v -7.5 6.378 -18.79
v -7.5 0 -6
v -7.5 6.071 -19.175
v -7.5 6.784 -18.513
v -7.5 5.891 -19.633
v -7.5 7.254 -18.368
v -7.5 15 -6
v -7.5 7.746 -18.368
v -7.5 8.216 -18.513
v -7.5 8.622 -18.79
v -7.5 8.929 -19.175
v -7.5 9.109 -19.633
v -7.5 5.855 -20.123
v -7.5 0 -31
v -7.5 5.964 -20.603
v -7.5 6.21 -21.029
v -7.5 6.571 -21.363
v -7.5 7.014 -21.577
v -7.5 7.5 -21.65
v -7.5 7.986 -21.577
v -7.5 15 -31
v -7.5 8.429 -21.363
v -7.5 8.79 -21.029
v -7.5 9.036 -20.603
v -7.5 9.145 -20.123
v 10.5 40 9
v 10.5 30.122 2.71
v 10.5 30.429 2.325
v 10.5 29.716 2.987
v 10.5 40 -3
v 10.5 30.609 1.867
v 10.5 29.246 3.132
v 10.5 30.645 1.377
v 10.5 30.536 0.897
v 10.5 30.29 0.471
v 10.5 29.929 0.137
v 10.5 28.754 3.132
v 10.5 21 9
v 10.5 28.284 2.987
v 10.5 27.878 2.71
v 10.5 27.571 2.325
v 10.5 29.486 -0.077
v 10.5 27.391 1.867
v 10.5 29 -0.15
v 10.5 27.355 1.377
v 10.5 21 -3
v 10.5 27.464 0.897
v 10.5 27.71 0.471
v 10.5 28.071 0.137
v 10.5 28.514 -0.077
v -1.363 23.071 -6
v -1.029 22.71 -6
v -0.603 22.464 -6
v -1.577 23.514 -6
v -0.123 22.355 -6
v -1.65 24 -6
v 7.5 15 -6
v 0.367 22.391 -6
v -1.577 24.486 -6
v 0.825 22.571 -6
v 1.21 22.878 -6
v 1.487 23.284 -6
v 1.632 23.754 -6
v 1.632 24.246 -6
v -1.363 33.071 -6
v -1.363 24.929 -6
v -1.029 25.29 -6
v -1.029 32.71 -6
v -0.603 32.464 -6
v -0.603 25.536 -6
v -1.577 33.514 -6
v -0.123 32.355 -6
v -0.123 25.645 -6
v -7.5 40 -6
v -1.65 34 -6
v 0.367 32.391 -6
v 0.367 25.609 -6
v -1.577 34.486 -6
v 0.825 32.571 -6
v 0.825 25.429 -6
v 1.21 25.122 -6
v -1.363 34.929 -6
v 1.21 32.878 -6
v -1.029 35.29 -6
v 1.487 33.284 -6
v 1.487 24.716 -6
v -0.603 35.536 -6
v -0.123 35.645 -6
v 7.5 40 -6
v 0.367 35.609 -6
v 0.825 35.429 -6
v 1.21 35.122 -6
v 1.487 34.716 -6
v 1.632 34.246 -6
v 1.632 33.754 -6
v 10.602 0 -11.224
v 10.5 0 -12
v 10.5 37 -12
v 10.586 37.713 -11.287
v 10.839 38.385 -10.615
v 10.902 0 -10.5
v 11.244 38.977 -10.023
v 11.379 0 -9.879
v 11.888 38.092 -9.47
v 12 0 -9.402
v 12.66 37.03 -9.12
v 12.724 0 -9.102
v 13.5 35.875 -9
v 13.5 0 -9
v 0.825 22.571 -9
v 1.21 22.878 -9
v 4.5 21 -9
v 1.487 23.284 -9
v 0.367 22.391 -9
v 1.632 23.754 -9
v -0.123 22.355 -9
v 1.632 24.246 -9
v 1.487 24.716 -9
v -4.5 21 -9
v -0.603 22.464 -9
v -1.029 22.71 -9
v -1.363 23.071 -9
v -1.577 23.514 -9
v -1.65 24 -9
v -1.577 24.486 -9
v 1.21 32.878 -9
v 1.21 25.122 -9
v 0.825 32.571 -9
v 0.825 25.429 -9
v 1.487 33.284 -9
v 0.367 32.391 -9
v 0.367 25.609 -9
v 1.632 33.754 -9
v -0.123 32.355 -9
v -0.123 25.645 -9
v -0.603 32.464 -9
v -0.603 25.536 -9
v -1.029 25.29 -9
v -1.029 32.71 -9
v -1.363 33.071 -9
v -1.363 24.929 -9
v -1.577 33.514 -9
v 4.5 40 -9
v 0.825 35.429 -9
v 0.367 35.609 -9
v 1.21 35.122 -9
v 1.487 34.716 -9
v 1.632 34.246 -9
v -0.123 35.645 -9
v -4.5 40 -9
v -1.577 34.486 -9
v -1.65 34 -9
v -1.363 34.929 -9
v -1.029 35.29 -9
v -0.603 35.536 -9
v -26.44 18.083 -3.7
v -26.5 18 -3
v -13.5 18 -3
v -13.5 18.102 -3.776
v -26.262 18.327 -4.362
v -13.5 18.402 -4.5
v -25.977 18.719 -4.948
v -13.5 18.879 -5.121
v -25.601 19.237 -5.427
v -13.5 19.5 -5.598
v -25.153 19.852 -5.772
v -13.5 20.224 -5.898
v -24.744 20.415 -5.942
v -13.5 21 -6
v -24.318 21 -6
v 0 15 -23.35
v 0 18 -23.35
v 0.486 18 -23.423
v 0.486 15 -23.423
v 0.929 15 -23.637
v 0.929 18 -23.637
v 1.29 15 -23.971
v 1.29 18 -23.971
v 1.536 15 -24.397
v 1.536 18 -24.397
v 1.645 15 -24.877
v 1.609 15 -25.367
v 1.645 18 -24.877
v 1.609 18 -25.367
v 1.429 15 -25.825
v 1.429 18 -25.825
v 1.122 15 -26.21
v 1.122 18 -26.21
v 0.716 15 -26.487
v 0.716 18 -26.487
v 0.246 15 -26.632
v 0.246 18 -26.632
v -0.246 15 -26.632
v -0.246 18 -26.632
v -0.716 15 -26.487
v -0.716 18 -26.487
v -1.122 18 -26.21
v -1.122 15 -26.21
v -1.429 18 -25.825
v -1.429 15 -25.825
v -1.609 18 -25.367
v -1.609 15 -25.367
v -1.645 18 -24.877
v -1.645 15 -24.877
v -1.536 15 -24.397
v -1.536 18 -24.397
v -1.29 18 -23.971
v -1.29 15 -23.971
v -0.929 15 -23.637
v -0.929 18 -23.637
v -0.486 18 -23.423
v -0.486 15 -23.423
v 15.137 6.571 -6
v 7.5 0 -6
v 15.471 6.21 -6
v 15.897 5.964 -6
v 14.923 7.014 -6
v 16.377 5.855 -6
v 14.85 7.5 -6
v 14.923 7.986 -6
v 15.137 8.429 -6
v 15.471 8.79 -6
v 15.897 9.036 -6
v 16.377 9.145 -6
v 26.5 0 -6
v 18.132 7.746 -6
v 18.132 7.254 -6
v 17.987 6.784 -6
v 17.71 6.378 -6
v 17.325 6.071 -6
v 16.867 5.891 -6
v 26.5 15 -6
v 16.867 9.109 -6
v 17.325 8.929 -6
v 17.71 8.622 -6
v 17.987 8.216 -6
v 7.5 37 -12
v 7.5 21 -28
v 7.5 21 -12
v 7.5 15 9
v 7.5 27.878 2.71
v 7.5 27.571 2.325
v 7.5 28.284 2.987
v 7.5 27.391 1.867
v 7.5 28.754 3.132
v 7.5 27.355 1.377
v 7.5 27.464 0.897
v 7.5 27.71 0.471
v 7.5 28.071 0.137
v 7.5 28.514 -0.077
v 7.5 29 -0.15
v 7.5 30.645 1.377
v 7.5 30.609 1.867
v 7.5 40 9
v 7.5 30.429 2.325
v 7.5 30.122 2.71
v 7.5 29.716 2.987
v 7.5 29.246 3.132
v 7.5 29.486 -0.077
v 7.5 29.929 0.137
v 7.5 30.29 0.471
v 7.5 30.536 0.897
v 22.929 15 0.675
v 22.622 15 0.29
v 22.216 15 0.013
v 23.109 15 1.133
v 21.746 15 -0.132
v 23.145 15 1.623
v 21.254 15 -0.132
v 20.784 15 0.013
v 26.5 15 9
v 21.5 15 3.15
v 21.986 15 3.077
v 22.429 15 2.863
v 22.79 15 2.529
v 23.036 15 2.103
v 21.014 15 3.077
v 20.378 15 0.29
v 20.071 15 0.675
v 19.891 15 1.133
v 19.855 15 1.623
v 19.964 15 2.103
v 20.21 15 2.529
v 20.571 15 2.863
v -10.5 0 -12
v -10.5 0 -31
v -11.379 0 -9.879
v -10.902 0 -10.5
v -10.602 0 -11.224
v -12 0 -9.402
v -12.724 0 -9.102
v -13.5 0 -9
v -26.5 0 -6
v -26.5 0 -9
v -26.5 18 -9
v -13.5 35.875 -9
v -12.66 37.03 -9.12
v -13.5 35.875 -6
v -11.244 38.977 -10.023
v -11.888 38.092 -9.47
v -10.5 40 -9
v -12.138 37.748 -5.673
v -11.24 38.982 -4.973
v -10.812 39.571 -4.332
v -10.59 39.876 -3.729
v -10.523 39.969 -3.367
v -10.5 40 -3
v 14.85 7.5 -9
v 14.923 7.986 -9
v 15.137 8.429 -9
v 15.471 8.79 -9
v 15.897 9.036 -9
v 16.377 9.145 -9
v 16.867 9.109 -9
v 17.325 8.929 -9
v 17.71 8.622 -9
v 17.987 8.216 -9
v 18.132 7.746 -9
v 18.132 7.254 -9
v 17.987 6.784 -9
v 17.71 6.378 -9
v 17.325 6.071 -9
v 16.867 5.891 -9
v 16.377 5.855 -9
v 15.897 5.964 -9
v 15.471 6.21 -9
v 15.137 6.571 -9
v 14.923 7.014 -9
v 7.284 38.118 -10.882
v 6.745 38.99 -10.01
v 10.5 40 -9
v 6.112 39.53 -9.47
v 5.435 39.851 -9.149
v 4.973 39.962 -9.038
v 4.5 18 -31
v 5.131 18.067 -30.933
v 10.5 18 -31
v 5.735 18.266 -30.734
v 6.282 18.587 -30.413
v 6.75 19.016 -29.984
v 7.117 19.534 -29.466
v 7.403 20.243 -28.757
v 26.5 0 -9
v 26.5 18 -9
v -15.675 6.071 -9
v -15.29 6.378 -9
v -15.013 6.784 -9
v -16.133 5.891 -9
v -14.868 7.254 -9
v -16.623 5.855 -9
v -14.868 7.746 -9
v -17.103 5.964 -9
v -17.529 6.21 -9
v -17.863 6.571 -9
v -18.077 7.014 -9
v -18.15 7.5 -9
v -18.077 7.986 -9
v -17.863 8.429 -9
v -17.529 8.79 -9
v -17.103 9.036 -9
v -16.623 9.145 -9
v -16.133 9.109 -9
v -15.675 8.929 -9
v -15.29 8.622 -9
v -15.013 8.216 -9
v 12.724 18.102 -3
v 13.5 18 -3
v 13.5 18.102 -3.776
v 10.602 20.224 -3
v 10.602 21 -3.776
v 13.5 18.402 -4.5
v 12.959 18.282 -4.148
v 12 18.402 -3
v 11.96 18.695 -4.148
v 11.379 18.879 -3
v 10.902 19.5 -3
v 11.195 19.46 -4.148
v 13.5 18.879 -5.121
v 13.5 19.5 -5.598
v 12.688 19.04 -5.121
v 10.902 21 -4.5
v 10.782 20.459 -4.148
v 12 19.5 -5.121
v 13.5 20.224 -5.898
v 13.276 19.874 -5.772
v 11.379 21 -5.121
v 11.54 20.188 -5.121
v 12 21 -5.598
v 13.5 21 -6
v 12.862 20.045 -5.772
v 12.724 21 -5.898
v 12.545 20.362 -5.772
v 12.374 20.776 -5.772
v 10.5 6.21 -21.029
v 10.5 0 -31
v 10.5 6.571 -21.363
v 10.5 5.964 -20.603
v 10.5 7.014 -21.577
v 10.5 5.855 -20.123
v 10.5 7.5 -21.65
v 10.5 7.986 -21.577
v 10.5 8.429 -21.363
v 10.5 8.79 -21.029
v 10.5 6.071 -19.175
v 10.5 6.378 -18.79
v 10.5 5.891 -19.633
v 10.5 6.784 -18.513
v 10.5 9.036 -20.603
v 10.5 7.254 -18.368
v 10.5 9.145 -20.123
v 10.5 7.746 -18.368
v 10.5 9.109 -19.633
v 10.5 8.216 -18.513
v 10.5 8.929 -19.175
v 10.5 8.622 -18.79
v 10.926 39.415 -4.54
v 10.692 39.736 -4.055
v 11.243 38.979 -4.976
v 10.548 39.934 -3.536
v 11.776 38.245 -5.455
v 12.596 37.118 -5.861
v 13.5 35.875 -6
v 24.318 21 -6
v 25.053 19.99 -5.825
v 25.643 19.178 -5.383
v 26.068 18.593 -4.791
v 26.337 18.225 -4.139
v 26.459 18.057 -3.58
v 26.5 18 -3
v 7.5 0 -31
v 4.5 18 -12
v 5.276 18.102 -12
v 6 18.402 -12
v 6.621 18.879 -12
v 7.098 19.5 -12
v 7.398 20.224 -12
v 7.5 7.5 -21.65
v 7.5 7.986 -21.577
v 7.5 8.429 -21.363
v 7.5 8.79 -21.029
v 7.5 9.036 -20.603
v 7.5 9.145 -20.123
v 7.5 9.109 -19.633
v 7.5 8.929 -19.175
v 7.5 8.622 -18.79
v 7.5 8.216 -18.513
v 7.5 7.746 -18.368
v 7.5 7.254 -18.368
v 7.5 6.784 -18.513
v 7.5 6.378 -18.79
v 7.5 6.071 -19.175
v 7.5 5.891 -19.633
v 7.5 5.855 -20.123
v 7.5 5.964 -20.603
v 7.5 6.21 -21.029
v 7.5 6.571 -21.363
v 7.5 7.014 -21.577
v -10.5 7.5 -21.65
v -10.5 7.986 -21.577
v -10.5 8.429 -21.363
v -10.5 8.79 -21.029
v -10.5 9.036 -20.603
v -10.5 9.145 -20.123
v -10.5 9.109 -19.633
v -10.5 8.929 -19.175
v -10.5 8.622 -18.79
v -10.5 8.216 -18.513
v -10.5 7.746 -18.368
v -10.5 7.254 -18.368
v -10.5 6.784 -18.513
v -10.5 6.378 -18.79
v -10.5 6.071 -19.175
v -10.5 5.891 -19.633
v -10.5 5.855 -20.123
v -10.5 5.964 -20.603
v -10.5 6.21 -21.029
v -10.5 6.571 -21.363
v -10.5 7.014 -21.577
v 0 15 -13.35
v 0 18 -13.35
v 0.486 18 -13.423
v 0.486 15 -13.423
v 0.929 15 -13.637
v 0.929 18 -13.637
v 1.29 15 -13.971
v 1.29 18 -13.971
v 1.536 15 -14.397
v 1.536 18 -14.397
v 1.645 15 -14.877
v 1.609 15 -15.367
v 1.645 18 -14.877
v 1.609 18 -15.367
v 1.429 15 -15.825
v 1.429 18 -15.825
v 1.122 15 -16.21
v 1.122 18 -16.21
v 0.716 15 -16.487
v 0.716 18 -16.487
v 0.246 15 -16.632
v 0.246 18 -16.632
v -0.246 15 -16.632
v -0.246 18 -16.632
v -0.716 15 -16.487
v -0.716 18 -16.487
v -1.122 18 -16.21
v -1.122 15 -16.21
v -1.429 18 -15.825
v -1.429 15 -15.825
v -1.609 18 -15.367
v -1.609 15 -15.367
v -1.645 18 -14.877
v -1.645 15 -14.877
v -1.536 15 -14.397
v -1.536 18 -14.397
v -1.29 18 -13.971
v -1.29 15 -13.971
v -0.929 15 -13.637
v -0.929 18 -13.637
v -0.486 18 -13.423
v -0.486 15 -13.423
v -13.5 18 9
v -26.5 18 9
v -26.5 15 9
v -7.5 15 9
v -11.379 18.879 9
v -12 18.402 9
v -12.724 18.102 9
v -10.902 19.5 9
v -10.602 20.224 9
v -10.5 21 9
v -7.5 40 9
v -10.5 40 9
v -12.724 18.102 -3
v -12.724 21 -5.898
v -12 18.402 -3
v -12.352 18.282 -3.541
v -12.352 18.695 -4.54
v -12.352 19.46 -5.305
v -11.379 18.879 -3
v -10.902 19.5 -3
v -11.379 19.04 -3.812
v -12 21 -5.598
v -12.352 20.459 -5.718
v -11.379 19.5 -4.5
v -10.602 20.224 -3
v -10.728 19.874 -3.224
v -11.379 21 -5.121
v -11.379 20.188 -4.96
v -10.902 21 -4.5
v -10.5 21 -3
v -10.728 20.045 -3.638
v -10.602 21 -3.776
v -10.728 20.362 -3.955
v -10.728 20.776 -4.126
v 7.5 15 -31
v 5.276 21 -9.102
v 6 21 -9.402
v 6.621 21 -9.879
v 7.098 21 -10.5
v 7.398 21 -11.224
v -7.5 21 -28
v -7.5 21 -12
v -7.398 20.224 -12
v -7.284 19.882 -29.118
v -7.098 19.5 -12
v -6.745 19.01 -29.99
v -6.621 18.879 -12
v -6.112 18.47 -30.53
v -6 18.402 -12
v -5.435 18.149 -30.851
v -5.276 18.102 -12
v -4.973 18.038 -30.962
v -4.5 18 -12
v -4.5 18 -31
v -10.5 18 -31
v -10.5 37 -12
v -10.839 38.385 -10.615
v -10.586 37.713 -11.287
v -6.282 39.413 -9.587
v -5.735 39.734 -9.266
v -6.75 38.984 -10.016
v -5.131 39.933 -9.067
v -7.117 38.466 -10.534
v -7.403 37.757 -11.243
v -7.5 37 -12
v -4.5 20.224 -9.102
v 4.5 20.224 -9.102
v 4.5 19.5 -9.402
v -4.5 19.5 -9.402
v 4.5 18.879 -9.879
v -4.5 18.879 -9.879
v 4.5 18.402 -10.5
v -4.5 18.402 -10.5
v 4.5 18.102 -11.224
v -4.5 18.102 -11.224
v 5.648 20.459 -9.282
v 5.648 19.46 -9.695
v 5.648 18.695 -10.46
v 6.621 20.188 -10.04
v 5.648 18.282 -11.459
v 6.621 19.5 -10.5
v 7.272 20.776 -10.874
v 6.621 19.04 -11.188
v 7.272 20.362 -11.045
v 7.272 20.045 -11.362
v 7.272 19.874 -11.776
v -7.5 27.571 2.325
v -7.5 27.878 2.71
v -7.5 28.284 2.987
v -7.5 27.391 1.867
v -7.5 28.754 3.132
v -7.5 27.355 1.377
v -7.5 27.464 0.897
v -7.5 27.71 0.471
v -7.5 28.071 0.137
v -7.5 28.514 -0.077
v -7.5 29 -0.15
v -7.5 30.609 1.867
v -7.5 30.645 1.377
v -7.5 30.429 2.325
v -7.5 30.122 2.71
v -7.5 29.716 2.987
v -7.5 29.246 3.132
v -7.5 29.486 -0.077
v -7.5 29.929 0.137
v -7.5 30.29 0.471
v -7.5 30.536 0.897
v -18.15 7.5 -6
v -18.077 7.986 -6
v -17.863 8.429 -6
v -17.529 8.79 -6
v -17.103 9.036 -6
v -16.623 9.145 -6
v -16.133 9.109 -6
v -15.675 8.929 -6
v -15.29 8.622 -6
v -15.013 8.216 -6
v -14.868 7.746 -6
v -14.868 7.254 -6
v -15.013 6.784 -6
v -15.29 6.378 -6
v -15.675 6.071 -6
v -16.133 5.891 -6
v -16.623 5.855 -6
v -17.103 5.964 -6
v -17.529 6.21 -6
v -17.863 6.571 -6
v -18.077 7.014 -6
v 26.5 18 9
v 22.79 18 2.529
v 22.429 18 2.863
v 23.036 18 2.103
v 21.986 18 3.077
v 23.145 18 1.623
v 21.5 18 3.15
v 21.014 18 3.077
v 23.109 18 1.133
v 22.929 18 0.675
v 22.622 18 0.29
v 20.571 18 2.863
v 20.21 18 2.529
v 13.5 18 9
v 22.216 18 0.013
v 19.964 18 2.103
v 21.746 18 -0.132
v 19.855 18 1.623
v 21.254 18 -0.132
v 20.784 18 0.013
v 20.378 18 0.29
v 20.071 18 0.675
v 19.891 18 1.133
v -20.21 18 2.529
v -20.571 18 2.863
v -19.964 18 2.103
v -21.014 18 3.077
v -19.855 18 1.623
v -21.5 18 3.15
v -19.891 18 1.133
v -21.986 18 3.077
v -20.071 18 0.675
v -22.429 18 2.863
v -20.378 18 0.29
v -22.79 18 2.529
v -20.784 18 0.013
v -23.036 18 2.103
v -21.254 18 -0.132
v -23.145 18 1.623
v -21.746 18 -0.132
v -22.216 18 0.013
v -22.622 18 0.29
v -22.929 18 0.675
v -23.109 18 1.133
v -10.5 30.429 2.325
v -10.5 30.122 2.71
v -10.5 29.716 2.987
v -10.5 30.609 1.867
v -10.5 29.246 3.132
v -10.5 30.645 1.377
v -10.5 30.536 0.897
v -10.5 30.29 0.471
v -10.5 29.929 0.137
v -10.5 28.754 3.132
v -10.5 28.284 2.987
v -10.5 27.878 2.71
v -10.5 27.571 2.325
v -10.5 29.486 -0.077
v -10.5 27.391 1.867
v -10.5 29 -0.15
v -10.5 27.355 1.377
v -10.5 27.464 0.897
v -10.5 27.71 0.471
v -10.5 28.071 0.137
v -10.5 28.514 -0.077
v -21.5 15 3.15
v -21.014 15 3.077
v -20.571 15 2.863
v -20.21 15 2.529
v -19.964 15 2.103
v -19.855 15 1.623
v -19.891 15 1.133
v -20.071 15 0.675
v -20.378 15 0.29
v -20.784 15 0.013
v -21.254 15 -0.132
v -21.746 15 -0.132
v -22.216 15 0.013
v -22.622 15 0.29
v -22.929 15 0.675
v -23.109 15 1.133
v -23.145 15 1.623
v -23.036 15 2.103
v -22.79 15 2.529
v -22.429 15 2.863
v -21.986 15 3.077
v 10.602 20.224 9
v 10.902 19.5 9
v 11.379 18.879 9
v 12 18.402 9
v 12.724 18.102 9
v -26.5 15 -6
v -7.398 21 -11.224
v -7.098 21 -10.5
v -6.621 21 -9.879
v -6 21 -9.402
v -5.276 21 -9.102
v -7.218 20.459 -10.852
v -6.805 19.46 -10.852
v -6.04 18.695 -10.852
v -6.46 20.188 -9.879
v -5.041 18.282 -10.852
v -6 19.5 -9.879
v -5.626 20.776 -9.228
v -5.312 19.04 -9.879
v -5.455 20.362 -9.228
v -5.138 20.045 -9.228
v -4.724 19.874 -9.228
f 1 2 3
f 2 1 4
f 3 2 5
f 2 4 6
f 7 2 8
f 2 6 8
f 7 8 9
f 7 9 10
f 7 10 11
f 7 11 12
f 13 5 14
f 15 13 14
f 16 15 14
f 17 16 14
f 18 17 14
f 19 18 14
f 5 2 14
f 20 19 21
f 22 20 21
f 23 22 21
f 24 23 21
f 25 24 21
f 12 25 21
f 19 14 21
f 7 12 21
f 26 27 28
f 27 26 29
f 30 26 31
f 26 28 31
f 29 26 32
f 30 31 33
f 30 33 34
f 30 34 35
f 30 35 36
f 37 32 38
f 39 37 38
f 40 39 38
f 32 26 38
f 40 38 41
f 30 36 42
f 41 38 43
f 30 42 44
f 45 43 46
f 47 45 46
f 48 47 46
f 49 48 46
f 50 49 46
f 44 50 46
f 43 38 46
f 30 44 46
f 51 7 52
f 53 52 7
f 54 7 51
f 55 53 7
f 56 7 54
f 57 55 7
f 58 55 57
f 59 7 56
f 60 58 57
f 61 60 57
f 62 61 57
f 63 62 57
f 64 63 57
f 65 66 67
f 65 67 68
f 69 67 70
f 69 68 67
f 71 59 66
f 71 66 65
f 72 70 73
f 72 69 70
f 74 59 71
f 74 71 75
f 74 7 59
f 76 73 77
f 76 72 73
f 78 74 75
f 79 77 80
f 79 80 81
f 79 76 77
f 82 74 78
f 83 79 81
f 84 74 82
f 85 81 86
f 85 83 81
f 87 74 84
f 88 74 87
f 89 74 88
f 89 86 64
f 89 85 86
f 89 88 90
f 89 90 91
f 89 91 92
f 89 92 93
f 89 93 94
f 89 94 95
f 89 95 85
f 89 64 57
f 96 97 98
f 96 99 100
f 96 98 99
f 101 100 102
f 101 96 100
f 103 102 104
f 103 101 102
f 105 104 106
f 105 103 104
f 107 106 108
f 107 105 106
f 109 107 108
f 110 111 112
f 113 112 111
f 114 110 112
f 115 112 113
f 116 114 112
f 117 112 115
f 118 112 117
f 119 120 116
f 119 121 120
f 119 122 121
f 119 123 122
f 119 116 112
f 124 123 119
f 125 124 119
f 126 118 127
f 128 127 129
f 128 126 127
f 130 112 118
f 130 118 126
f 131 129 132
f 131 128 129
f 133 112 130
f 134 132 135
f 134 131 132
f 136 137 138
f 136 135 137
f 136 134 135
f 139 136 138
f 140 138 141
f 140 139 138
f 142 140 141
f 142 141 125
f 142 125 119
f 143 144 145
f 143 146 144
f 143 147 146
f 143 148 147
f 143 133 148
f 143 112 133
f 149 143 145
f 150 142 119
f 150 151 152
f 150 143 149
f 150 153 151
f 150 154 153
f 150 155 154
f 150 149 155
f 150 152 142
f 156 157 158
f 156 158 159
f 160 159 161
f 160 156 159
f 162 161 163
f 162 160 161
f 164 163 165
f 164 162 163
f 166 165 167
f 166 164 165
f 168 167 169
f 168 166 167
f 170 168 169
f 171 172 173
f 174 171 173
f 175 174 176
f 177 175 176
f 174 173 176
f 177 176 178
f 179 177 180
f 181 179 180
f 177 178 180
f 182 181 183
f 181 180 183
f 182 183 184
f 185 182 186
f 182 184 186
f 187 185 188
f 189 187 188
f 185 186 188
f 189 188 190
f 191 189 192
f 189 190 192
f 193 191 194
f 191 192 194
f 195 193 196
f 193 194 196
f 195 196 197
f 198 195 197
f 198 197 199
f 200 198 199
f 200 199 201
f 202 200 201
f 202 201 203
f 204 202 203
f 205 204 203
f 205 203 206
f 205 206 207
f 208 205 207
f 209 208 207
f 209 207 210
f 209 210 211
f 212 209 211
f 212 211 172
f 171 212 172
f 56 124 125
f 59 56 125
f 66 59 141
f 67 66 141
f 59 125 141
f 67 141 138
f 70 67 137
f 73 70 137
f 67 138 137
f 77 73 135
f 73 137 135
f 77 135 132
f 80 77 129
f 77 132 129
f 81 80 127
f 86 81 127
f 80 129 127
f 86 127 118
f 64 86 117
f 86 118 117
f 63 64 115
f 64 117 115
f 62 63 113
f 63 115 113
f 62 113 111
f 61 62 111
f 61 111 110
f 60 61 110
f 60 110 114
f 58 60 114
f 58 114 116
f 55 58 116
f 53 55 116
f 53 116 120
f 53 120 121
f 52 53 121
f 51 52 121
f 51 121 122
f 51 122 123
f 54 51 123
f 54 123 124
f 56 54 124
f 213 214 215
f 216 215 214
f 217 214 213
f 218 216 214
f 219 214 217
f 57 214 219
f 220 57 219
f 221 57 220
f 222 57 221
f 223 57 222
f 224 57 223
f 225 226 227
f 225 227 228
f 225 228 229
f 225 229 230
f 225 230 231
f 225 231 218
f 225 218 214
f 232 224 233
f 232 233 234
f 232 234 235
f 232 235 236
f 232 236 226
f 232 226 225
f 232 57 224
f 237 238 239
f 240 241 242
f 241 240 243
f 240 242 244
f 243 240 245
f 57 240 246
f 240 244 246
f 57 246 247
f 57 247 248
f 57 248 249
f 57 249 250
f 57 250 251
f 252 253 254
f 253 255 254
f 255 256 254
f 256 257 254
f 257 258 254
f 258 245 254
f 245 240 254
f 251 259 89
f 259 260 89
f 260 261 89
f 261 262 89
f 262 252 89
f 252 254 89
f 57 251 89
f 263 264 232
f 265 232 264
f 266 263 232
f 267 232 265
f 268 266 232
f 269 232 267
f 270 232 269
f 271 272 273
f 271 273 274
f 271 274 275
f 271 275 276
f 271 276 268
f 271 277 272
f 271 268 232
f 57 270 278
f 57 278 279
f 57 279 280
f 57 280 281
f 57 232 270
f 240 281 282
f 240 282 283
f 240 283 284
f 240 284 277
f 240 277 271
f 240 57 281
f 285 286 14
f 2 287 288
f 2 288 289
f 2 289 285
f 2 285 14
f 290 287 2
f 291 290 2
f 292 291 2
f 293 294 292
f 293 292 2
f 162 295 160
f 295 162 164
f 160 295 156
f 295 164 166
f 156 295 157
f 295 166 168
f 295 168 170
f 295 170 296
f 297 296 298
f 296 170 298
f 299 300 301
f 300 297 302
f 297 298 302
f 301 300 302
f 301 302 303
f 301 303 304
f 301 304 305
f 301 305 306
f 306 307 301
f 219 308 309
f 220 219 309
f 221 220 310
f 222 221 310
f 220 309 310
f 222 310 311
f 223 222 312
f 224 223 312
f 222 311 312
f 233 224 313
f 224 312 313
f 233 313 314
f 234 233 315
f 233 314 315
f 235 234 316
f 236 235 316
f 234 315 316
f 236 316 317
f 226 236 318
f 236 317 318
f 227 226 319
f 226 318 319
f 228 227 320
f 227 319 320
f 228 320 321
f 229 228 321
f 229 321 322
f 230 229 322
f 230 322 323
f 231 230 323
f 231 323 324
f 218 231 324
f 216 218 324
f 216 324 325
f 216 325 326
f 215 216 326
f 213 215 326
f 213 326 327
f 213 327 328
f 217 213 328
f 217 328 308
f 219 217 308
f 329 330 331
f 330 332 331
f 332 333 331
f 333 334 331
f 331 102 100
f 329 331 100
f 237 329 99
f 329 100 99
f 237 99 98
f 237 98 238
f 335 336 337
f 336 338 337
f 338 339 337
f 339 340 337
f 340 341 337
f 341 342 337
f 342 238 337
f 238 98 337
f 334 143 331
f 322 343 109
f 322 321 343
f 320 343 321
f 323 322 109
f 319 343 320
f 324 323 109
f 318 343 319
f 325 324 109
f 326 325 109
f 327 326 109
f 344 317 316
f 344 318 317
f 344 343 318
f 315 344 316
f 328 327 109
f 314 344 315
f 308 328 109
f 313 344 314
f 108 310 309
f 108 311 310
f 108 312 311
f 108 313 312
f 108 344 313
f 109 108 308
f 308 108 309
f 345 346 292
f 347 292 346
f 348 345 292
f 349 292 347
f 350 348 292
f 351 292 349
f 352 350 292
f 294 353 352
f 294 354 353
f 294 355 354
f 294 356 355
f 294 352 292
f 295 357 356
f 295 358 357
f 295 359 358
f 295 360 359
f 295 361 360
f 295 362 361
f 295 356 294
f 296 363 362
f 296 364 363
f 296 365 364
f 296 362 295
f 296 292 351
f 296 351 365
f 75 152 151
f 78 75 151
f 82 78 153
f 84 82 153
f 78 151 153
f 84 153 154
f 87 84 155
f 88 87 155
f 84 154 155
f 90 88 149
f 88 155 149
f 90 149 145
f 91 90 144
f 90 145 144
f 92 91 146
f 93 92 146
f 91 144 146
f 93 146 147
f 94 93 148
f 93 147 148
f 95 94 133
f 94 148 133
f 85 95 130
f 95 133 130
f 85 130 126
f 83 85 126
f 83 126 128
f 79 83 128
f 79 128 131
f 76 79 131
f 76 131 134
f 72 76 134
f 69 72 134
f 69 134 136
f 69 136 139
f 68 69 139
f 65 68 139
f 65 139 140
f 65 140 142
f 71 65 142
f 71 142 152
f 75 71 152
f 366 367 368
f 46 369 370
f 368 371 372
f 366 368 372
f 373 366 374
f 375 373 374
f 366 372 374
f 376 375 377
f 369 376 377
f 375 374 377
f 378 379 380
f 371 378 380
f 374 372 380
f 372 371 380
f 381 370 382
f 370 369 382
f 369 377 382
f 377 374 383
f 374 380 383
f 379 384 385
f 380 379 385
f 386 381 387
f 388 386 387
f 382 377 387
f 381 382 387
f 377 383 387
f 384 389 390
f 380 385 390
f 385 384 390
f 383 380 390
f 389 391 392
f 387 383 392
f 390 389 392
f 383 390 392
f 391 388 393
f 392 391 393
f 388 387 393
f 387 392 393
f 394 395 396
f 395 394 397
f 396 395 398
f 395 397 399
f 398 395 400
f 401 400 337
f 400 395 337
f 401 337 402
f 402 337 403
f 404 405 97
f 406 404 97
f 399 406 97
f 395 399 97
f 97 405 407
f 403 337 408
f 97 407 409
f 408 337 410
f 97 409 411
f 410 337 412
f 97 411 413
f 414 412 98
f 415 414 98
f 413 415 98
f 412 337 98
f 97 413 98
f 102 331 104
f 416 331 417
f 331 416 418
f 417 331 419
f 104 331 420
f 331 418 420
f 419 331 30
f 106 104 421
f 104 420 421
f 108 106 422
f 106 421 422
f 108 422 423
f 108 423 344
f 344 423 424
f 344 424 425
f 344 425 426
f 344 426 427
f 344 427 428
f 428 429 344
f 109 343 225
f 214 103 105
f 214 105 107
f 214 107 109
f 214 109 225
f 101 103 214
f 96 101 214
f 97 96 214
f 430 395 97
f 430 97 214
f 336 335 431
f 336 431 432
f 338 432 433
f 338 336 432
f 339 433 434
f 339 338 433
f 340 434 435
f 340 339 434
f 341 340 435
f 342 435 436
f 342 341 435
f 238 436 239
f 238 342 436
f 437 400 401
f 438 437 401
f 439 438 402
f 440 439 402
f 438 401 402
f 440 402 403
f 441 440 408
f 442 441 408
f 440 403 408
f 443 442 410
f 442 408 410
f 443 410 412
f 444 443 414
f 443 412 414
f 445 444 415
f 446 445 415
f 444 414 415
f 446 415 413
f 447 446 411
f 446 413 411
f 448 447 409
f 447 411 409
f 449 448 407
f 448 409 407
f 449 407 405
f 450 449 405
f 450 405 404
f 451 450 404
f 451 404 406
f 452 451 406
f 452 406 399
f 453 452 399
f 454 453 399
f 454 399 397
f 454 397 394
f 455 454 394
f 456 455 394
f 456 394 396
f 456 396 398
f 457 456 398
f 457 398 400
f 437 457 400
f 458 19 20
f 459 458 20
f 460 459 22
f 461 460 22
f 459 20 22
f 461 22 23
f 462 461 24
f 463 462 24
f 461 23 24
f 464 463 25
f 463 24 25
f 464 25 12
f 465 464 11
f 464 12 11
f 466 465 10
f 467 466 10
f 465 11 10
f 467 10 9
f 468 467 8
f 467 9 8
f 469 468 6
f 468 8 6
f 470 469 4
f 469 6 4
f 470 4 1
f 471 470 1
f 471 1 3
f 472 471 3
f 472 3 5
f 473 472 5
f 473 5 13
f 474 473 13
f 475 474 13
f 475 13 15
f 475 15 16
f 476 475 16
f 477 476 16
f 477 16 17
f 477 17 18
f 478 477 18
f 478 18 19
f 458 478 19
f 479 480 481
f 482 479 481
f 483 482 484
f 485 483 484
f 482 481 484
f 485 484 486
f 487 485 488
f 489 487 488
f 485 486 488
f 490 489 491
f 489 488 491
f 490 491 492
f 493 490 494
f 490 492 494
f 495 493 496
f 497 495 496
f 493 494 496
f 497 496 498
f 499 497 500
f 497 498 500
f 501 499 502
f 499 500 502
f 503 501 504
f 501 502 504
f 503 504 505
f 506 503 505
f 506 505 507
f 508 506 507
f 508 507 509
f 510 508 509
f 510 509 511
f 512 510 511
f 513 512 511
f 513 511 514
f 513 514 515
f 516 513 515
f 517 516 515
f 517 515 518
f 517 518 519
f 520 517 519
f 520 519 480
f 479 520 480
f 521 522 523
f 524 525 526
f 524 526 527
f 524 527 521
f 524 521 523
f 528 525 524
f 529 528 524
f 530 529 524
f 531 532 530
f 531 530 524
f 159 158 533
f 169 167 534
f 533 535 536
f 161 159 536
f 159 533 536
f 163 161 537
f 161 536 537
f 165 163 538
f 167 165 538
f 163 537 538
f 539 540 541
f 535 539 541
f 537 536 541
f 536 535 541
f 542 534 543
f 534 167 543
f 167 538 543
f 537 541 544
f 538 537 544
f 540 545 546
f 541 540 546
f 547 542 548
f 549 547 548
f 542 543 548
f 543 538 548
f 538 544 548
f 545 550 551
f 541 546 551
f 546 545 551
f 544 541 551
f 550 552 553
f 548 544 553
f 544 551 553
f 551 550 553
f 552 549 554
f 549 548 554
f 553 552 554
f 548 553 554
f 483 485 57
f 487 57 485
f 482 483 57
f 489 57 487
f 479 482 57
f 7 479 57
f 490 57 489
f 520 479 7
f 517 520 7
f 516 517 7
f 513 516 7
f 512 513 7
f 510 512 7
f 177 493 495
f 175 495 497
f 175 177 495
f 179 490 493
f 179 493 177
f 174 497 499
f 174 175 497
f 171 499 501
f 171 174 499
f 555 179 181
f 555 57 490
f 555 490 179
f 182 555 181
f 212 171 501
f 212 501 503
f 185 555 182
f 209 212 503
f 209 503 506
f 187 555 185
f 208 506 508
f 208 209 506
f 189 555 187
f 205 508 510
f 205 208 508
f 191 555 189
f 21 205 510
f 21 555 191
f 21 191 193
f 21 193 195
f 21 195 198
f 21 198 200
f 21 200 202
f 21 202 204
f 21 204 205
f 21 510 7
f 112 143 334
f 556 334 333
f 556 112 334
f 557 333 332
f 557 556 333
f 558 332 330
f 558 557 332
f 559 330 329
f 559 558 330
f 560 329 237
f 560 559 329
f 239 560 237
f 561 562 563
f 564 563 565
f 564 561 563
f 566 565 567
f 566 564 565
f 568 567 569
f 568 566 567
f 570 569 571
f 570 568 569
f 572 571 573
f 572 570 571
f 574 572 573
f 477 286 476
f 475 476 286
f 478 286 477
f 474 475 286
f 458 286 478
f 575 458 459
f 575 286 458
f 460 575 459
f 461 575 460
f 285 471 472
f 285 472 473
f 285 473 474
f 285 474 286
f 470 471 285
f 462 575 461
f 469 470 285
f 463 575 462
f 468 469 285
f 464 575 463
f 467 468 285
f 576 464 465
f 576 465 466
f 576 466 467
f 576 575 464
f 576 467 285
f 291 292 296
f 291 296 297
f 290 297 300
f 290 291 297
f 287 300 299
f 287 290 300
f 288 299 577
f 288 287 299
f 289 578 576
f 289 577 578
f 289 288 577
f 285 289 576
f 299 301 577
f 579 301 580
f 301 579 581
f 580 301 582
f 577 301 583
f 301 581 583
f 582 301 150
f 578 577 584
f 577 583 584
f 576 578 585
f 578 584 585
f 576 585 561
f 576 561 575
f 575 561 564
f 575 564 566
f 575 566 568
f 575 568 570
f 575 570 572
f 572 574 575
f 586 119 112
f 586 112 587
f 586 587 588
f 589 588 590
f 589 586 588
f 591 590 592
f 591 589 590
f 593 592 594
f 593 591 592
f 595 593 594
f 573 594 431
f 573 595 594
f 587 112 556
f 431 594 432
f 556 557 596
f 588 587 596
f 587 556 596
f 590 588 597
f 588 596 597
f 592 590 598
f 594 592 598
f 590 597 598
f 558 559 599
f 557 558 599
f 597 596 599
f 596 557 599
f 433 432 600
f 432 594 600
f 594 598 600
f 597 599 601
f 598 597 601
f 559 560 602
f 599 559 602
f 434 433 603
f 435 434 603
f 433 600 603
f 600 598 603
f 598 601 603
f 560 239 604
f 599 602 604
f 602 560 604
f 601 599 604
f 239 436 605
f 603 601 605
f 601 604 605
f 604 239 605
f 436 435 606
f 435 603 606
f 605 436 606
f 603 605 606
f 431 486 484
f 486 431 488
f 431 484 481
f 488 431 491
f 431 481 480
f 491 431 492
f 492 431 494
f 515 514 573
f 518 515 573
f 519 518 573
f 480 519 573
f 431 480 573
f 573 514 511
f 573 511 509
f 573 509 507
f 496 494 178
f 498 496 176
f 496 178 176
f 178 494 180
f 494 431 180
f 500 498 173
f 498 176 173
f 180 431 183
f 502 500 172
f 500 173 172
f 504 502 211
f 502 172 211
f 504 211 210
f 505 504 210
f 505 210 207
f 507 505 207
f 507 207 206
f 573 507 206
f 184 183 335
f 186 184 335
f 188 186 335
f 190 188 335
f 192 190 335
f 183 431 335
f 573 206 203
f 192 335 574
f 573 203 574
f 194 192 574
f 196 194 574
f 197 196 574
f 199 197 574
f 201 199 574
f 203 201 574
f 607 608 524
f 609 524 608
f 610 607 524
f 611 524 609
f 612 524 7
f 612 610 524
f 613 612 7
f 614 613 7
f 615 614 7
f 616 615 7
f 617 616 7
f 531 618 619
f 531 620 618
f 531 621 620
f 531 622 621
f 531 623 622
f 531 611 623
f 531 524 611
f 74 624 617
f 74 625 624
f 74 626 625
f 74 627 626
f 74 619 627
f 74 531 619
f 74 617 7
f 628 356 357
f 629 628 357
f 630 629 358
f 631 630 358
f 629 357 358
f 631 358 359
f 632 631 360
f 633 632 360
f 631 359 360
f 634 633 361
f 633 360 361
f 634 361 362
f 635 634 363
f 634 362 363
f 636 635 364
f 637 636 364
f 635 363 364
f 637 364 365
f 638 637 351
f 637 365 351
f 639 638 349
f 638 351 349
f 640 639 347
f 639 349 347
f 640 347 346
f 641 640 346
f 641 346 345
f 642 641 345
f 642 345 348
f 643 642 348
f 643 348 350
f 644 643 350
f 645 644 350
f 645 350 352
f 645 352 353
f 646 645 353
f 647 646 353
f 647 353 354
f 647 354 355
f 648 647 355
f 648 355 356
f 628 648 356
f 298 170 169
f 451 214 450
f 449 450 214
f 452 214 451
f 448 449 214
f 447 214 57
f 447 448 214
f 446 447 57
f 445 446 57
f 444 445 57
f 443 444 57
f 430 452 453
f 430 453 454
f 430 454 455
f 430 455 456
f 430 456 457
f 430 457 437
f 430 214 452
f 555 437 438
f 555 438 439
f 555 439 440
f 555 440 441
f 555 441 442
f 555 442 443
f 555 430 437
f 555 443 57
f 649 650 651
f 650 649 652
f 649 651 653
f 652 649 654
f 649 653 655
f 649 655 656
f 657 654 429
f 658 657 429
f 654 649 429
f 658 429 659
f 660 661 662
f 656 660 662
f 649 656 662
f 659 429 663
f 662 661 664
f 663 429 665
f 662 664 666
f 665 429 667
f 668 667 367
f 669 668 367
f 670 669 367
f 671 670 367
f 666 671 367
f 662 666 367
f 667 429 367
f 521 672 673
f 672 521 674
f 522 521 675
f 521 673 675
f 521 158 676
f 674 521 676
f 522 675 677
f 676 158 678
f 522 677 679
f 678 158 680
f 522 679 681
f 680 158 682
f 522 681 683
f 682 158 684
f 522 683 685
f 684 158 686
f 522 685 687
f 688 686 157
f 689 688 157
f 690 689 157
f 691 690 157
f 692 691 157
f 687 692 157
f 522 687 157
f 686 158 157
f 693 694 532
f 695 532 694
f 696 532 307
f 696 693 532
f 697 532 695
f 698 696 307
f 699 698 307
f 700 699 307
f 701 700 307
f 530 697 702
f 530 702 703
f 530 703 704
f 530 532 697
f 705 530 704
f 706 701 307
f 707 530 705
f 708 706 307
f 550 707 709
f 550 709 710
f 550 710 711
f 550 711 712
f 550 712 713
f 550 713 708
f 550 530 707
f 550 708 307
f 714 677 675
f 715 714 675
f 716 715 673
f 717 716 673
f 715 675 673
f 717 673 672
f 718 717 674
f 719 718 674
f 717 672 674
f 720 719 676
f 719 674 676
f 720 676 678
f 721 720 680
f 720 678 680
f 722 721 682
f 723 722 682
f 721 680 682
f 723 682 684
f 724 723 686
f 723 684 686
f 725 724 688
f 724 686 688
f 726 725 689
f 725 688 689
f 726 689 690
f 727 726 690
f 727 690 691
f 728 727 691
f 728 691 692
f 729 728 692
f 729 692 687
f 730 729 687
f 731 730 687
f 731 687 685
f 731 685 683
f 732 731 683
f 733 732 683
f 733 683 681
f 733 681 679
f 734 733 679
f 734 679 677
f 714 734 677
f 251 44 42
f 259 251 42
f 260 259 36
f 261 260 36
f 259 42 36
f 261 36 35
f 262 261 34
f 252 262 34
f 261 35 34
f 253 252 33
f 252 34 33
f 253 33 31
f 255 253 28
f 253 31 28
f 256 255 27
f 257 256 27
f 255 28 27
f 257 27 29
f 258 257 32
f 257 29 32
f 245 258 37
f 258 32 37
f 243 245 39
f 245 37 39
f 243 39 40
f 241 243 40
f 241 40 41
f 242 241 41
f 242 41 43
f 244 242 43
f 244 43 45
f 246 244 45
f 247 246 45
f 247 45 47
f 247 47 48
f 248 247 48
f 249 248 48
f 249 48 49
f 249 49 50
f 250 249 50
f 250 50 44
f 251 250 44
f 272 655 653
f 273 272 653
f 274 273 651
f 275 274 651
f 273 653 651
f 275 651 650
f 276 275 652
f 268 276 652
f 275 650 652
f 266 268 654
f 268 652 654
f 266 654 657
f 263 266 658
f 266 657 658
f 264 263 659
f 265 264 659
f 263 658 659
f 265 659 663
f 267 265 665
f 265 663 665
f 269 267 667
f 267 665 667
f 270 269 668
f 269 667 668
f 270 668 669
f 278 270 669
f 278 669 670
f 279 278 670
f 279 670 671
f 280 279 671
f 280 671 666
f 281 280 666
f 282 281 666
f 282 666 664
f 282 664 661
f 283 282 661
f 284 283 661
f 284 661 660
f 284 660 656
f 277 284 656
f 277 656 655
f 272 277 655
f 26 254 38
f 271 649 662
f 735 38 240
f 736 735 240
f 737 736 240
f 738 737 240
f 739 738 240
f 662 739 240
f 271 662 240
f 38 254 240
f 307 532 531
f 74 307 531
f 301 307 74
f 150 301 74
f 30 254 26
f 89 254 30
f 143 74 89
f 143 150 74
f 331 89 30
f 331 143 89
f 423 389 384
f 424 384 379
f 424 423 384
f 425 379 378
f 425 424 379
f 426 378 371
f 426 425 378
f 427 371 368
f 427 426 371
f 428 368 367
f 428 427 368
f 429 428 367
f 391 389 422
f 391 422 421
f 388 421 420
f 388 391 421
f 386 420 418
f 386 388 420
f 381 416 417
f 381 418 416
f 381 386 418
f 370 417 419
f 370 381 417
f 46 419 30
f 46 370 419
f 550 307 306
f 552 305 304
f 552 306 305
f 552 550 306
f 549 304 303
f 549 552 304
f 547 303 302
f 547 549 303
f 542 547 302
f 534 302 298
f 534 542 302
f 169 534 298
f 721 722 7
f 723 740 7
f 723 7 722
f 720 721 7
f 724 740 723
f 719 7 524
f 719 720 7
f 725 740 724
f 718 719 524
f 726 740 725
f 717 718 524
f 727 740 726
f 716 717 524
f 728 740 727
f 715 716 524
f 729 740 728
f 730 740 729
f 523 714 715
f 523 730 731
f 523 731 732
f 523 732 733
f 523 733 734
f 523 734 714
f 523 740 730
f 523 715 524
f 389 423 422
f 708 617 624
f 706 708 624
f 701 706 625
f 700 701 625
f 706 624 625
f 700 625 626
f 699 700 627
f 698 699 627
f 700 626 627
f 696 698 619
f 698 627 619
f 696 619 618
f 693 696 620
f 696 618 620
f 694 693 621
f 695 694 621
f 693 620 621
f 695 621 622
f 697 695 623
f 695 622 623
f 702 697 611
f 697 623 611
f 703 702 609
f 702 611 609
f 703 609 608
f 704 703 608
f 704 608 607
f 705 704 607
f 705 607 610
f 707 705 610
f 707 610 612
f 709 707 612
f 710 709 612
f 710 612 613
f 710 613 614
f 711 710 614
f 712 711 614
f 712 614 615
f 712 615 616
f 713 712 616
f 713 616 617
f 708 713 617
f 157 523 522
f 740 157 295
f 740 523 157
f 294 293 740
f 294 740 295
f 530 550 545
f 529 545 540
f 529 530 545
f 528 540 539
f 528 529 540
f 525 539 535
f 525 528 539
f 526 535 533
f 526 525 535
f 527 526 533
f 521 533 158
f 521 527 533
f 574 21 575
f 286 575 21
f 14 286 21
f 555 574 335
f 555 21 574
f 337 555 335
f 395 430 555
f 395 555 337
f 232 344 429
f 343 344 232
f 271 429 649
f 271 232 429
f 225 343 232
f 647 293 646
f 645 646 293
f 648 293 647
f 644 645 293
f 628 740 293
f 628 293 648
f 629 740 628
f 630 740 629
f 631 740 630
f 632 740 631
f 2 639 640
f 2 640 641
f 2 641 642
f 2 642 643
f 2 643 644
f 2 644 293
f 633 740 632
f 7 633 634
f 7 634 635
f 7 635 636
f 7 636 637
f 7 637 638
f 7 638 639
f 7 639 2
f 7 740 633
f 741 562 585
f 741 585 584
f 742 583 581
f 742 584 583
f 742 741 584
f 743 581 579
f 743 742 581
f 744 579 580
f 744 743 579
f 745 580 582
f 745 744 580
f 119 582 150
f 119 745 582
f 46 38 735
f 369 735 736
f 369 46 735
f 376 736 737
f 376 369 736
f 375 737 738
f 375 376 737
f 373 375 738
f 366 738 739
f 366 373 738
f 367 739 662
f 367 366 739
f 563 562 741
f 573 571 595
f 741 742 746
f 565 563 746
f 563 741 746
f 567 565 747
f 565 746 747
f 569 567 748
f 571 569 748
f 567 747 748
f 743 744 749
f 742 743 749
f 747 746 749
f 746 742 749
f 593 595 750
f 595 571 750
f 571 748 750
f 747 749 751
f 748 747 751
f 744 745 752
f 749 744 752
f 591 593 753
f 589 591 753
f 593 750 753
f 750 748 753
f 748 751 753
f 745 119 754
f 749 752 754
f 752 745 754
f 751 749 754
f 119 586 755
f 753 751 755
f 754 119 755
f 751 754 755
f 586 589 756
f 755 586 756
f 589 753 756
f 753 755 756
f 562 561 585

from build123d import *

# Parameters (mm, degrees)
EXTRUDE_1_DEPTH     = 18
SKETCH_2_W          = 21
SKETCH_2_H          = 18
EXTRUDE_2_DEPTH     = 22
SKETCH_3_W          = 15
SKETCH_3_H          = 15
CUT_EXTRUDE_1_DEPTH = 74.280283842
SKETCH_4_W          = 15
SKETCH_4_H          = 15
CUT_EXTRUDE_2_DEPTH = 58.124863238
SKETCH_5_W          = 15
SKETCH_5_H          = 15
CUT_EXTRUDE_3_DEPTH = 63.467991804
SKETCH_6_R          = 1.65
CUT_EXTRUDE_4_DEPTH = 53.784941034
SKETCH_7_R          = 1.65
CUT_EXTRUDE_5_DEPTH = 47.338428976
SKETCH_8_R          = 1.65
CUT_EXTRUDE_6_DEPTH = 63.689712075
EXTRUDE_4_DEPTH     = 3
EXTRUDE_5_DEPTH     = 3
EXTRUDE_6_DEPTH     = 3
FILLET_1_R          = 3


with BuildPart() as part:
    # 草图1 → 凸台-拉伸1 (new body)
    with BuildSketch(Plane(origin=(0, 0, 0), x_dir=(1, 0, 0), z_dir=(0, 1, 0))):
        Polygon((10.5, 9), (26.5, 9), (26.5, -9), (-26.5, -9), (-26.5, 9), (-10.5, 9), (-10.5, 31), (10.5, 31), align=None)
    extrude(amount=EXTRUDE_1_DEPTH)

    # 草图2 → 凸台-拉伸2 (add)
    with BuildSketch(Plane(origin=(0, 18, 0), x_dir=(1, 0, 0), z_dir=(0, 1, 0))):
        Rectangle(SKETCH_2_W, SKETCH_2_H)
    extrude(amount=EXTRUDE_2_DEPTH)

    # 草图3 → 切除-拉伸1 (cut, through all)
    with BuildSketch(Plane.ZY.offset(26.5)):
        with Locations((1.5, 7.5)):
            Rectangle(SKETCH_3_W, SKETCH_3_H)
    extrude(amount=-CUT_EXTRUDE_1_DEPTH, mode=Mode.SUBTRACT)

    # 草图4 → 切除-拉伸2 (cut, through all)
    with BuildSketch(Plane(origin=(0, 40, 0), x_dir=(1, 0, 0), z_dir=(0, 1, 0))):
        with Locations((0, -1.5)):
            Rectangle(SKETCH_4_W, SKETCH_4_H)
    extrude(amount=-CUT_EXTRUDE_2_DEPTH, mode=Mode.SUBTRACT)

    # 草图5 → 切除-拉伸3 (cut, through all)
    with BuildSketch(Plane(origin=(0, 0, -31), x_dir=(-1, 0, 0), z_dir=(0, 0, -1))):
        with Locations((0, 7.5)):
            Rectangle(SKETCH_5_W, SKETCH_5_H)
    extrude(amount=-CUT_EXTRUDE_3_DEPTH, mode=Mode.SUBTRACT)

    # 草图6 → 切除-拉伸4 (cut, through all)
    with BuildSketch(Plane(origin=(0, 0, -9), x_dir=(-1, 0, 0), z_dir=(0, 0, -1))):
        with Locations((-16.5, 7.5)):
            Circle(SKETCH_6_R)
        with Locations((0, 24)):
            Circle(SKETCH_6_R)
        with Locations((16.5, 7.5)):
            Circle(SKETCH_6_R)
        with Locations((0, 34)):
            Circle(SKETCH_6_R)
    extrude(amount=-CUT_EXTRUDE_4_DEPTH, mode=Mode.SUBTRACT)

    # 草图7 → 切除-拉伸5 (cut, through all)
    with BuildSketch(Plane(origin=(0, 18, 0), x_dir=(1, 0, 0), z_dir=(0, 1, 0))):
        with Locations(Location((-21.5, -1.5, 0), (0, 0, 270))):
            Circle(SKETCH_7_R)
        with Locations(Location((0, 15, 0), (0, 0, 270))):
            Circle(SKETCH_7_R)
        with Locations(Location((0, 25, 0), (0, 0, 270))):
            Circle(SKETCH_7_R)
        with Locations(Location((21.5, -1.5, 0), (0, 0, 270))):
            Circle(SKETCH_7_R)
    extrude(amount=-CUT_EXTRUDE_5_DEPTH, mode=Mode.SUBTRACT)

    # 草图8 → 切除-拉伸6 (cut, through all)
    with BuildSketch(Plane(origin=(10.5, 0, 0), x_dir=(0, 0, -1), z_dir=(1, 0, 0))):
        with Locations((-1.5, 29)):
            Circle(SKETCH_8_R)
        with Locations((20, 7.5)):
            Circle(SKETCH_8_R)
    extrude(amount=-CUT_EXTRUDE_6_DEPTH, mode=Mode.SUBTRACT)

    # 草图9 → 凸台-拉伸4 (add)
    with BuildSketch(Plane(origin=(0, 0, -9), x_dir=(-1, 0, 0), z_dir=(0, 0, -1))):
        Polygon((-10.5, 40), (-26.5, 18), (-10.5, 18), align=None)
        Polygon((10.5, 40), (26.5, 18), (10.5, 18), align=None)
    extrude(amount=-EXTRUDE_4_DEPTH)

    # 草图10 → 凸台-拉伸5 (add)
    with BuildSketch(Plane(origin=(10.5, 0, 0), x_dir=(0, 0, -1), z_dir=(1, 0, 0))):
        Polygon((9, 40), (31, 18), (9, 18), align=None)
    extrude(amount=-EXTRUDE_5_DEPTH)

    # 草图11 → 凸台-拉伸6 (add)
    with BuildSketch(Plane.ZY.offset(10.5)):
        Polygon((-9, 40), (-31, 18), (-9, 18), align=None)
    extrude(amount=-EXTRUDE_6_DEPTH)

    # 圆角1
    # the kernel refuses this fillet: 3 mm, written as the material it adds along each edge
    with BuildSketch(Plane(origin=(-13.5, 21, -3), x_dir=(0, -1, 0), z_dir=(1, 0, 0))) as fillet_1_piece_1_section:
        Polygon((0, 0), (FILLET_1_R, 0), (FILLET_1_R, FILLET_1_R), (0, FILLET_1_R), align=None)
    fillet_1_piece_1 = extrude(amount=FILLET_1_R, mode=Mode.PRIVATE)
    fillet_1_piece_1 = fillet_1_piece_1 - Plane(origin=(-13.5, 21, -3), x_dir=(0, 0.7071067811865475, 0.7071067811865475), z_dir=(1, 0, 0)) * Sphere(FILLET_1_R, mode=Mode.PRIVATE)
    add(fillet_1_piece_1)
    with BuildSketch(Plane(origin=(13.5, 21, -3), x_dir=(0, -1, 0), z_dir=(0, 0, -1))) as fillet_1_piece_2_section:
        Polygon((0, 0), (FILLET_1_R, 0), (FILLET_1_R, FILLET_1_R), (0, FILLET_1_R), align=None)
    fillet_1_piece_2 = extrude(amount=FILLET_1_R, mode=Mode.PRIVATE)
    fillet_1_piece_2 = fillet_1_piece_2 - Plane(origin=(13.5, 21, -3), x_dir=(0.7071067811865475, 0.7071067811865475, 0), z_dir=(0, 0, -1)) * Sphere(FILLET_1_R, mode=Mode.PRIVATE)
    add(fillet_1_piece_2)
    with BuildSketch(Plane(origin=(-4.5, 21, -12), x_dir=(-1, 0, 0), z_dir=(0, 0, 1))) as fillet_1_piece_3_section:
        Polygon((0, 0), (FILLET_1_R, 0), (FILLET_1_R, FILLET_1_R), (0, FILLET_1_R), align=None)
    fillet_1_piece_3 = extrude(amount=FILLET_1_R, mode=Mode.PRIVATE)
    fillet_1_piece_3 = fillet_1_piece_3 - Plane(origin=(-4.5, 21, -12), x_dir=(0.7071067811865475, 0.7071067811865475, 0), z_dir=(0, 0, 1)) * Sphere(FILLET_1_R, mode=Mode.PRIVATE)
    add(fillet_1_piece_3)
    with BuildSketch(Plane(origin=(4.5, 21, -12), x_dir=(0, 0, 1), z_dir=(1, 0, 0))) as fillet_1_piece_4_section:
        Polygon((0, 0), (FILLET_1_R, 0), (FILLET_1_R, FILLET_1_R), (0, FILLET_1_R), align=None)
    fillet_1_piece_4 = extrude(amount=FILLET_1_R, mode=Mode.PRIVATE)
    fillet_1_piece_4 = fillet_1_piece_4 - Plane(origin=(4.5, 21, -12), x_dir=(0, 0.7071067811865475, -0.7071067811865475), z_dir=(1, 0, 0)) * Sphere(FILLET_1_R, mode=Mode.PRIVATE)
    add(fillet_1_piece_4)
    with BuildSketch(Plane(origin=(-10.5, 18, 9), x_dir=(-1, 0, 0), z_dir=(0, 0, -1))) as fillet_1_piece_5:
        with BuildLine():
            CenterArc((FILLET_1_R, FILLET_1_R), FILLET_1_R, 180, 90)
            Line((0, FILLET_1_R), (0, 0))
            Line((0, 0), (FILLET_1_R, 0))
        make_face()
    extrude(amount=12)
    with BuildSketch(Plane(origin=(10.5, 21, -6), x_dir=(0, 0, 1), z_dir=(0, 1, 0))) as fillet_1_piece_6_section:
        with BuildLine():
            CenterArc((FILLET_1_R, FILLET_1_R), FILLET_1_R, 180, 90)
            Line((0, FILLET_1_R), (0, 0))
            Line((0, 0), (FILLET_1_R, 0))
        make_face()
    fillet_1_piece_6 = extrude(amount=19, mode=Mode.PRIVATE)
    fillet_1_piece_6 = split(fillet_1_piece_6, bisect_by=Plane(origin=(15.455477793, 33.186218035, -5.302148296), z_dir=(-0.8087360843031884, -0.5881716976750465, 0)), keep=Keep.TOP, mode=Mode.PRIVATE)
    add(fillet_1_piece_6)
    with BuildSketch(Plane(origin=(26.5, 18, -6), x_dir=(0, 1, 0), z_dir=(-1, 0, 0))) as fillet_1_piece_7_section:
        with BuildLine():
            CenterArc((FILLET_1_R, -FILLET_1_R), FILLET_1_R, 90, 90)
            Line((0, -FILLET_1_R), (0, 0))
            Line((0, 0), (FILLET_1_R, 0))
        make_face()
    fillet_1_piece_7 = extrude(amount=13, mode=Mode.PRIVATE)
    fillet_1_piece_7 = split(fillet_1_piece_7, bisect_by=Plane(origin=(23.857097581, 21.633990826, -5.306552659), z_dir=(-0.8087360843031884, -0.5881716976750465, 0)), keep=Keep.TOP, mode=Mode.PRIVATE)
    add(fillet_1_piece_7)
    with BuildSketch(Plane(origin=(-10.5, 0, -9), x_dir=(0, 0, -1), z_dir=(0, 1, 0))) as fillet_1_piece_8_section:
        with BuildLine():
            CenterArc((FILLET_1_R, FILLET_1_R), FILLET_1_R, 180, 90)
            Line((0, FILLET_1_R), (0, 0))
            Line((0, 0), (FILLET_1_R, 0))
        make_face()
    fillet_1_piece_8 = extrude(amount=47.5, mode=Mode.PRIVATE)
    fillet_1_piece_8 = split(fillet_1_piece_8, bisect_by=Plane(origin=(-11.170543691, 29.3263589, -19.6736411), z_dir=(0, -0.7071067811865478, 0.7071067811865474)), keep=Keep.TOP, mode=Mode.PRIVATE)
    fillet_1_piece_8 = split(fillet_1_piece_8, bisect_by=Plane(origin=(-20.564055467, 26.161923732, -9.677561004), z_dir=(0.8087360843031883, -0.5881716976750465, 0)), keep=Keep.TOP, mode=Mode.PRIVATE)
    add(fillet_1_piece_8)
    with BuildSketch(Plane(origin=(10.5, 0, -9), x_dir=(1, 0, 0), z_dir=(0, 1, 0))) as fillet_1_piece_9_section:
        with BuildLine():
            CenterArc((FILLET_1_R, FILLET_1_R), FILLET_1_R, 180, 90)
            Line((0, FILLET_1_R), (0, 0))
            Line((0, 0), (FILLET_1_R, 0))
        make_face()
    fillet_1_piece_9 = extrude(amount=47.5, mode=Mode.PRIVATE)
    fillet_1_piece_9 = split(fillet_1_piece_9, bisect_by=Plane(origin=(20.564055468, 26.161923731, -9.677561004), z_dir=(-0.8087360843031884, -0.5881716976750465, 0)), keep=Keep.TOP, mode=Mode.PRIVATE)
    fillet_1_piece_9 = split(fillet_1_piece_9, bisect_by=Plane(origin=(11.170543691, 29.326358899, -19.673641101), z_dir=(0, -0.7071067811865478, 0.7071067811865474)), keep=Keep.TOP, mode=Mode.PRIVATE)
    add(fillet_1_piece_9)
    with BuildSketch(Plane(origin=(-10.5, 21, -6), x_dir=(-1, 0, 0), z_dir=(0, 1, 0))) as fillet_1_piece_10_section:
        with BuildLine():
            CenterArc((FILLET_1_R, FILLET_1_R), FILLET_1_R, 180, 90)
            Line((0, FILLET_1_R), (0, 0))
            Line((0, 0), (FILLET_1_R, 0))
        make_face()
    fillet_1_piece_10 = extrude(amount=19, mode=Mode.PRIVATE)
    fillet_1_piece_10 = split(fillet_1_piece_10, bisect_by=Plane(origin=(-15.455477793, 33.186218035, -5.302148296), z_dir=(0.8087360843031883, -0.5881716976750465, 0)), keep=Keep.TOP, mode=Mode.PRIVATE)
    add(fillet_1_piece_10)
    with BuildSketch(Plane(origin=(-26.5, 18, -6), x_dir=(0, 0, 1), z_dir=(1, 0, 0))) as fillet_1_piece_11_section:
        with BuildLine():
            CenterArc((FILLET_1_R, -FILLET_1_R), FILLET_1_R, 90, 90)
            Line((0, -FILLET_1_R), (0, 0))
            Line((0, 0), (FILLET_1_R, 0))
        make_face()
    fillet_1_piece_11 = extrude(amount=13, mode=Mode.PRIVATE)
    fillet_1_piece_11 = split(fillet_1_piece_11, bisect_by=Plane(origin=(-23.857097581, 21.633990826, -5.306552659), z_dir=(0.8087360843031883, -0.5881716976750465, 0)), keep=Keep.TOP, mode=Mode.PRIVATE)
    add(fillet_1_piece_11)
    with BuildSketch(Plane(origin=(-4.5, 18, -9), x_dir=(0, 0, -1), z_dir=(1, 0, 0))) as fillet_1_piece_12:
        with BuildLine():
            CenterArc((FILLET_1_R, FILLET_1_R), FILLET_1_R, 180, 90)
            Line((0, FILLET_1_R), (0, 0))
            Line((0, 0), (FILLET_1_R, 0))
        make_face()
    extrude(amount=9)
    with BuildSketch(Plane(origin=(7.5, 21, -9), x_dir=(0, 0, -1), z_dir=(0, 1, 0))) as fillet_1_piece_13_section:
        with BuildLine():
            CenterArc((FILLET_1_R, FILLET_1_R), FILLET_1_R, 180, 90)
            Line((0, FILLET_1_R), (0, 0))
            Line((0, 0), (FILLET_1_R, 0))
        make_face()
    fillet_1_piece_13 = extrude(amount=19, mode=Mode.PRIVATE)
    fillet_1_piece_13 = split(fillet_1_piece_13, bisect_by=Plane(origin=(6.80742854, 34.757043793, -14.242956207), z_dir=(0, -0.7071067811865478, 0.7071067811865474)), keep=Keep.TOP, mode=Mode.PRIVATE)
    add(fillet_1_piece_13)
    with BuildSketch(Plane(origin=(7.5, 18, -31), x_dir=(-1, 0, 0), z_dir=(0, 0, 1))) as fillet_1_piece_14_section:
        with BuildLine():
            CenterArc((FILLET_1_R, -FILLET_1_R), FILLET_1_R, 90, 90)
            Line((0, -FILLET_1_R), (0, 0))
            Line((0, 0), (FILLET_1_R, 0))
        make_face()
    fillet_1_piece_14 = extrude(amount=19, mode=Mode.PRIVATE)
    fillet_1_piece_14 = split(fillet_1_piece_14, bisect_by=Plane(origin=(6.80742854, 23.242956207, -25.757043793), z_dir=(0, -0.7071067811865478, 0.7071067811865474)), keep=Keep.TOP, mode=Mode.PRIVATE)
    add(fillet_1_piece_14)
    with BuildSketch(Plane(origin=(-7.5, 21, -9), x_dir=(1, 0, 0), z_dir=(0, 1, 0))) as fillet_1_piece_15_section:
        with BuildLine():
            CenterArc((FILLET_1_R, FILLET_1_R), FILLET_1_R, 180, 90)
            Line((0, FILLET_1_R), (0, 0))
            Line((0, 0), (FILLET_1_R, 0))
        make_face()
    fillet_1_piece_15 = extrude(amount=19, mode=Mode.PRIVATE)
    fillet_1_piece_15 = split(fillet_1_piece_15, bisect_by=Plane(origin=(-6.80742854, 34.757043793, -14.242956207), z_dir=(0, -0.7071067811865478, 0.7071067811865474)), keep=Keep.TOP, mode=Mode.PRIVATE)
    add(fillet_1_piece_15)
    with BuildSketch(Plane(origin=(-7.5, 18, -31), x_dir=(1, 0, 0), z_dir=(0, 0, 1))) as fillet_1_piece_16_section:
        with BuildLine():
            CenterArc((FILLET_1_R, FILLET_1_R), FILLET_1_R, 180, 90)
            Line((0, FILLET_1_R), (0, 0))
            Line((0, 0), (FILLET_1_R, 0))
        make_face()
    fillet_1_piece_16 = extrude(amount=19, mode=Mode.PRIVATE)
    fillet_1_piece_16 = split(fillet_1_piece_16, bisect_by=Plane(origin=(-6.80742854, 23.242956207, -25.757043793), z_dir=(0, -0.7071067811865478, 0.7071067811865474)), keep=Keep.TOP, mode=Mode.PRIVATE)
    add(fillet_1_piece_16)
    with BuildSketch(Plane(origin=(10.5, 18, -3), x_dir=(0, 1, 0), z_dir=(0, 0, 1))) as fillet_1_piece_17:
        with BuildLine():
            CenterArc((FILLET_1_R, -FILLET_1_R), FILLET_1_R, 90, 90)
            Line((0, -FILLET_1_R), (0, 0))
            Line((0, 0), (FILLET_1_R, 0))
        make_face()
    extrude(amount=12)


solid = part.part
